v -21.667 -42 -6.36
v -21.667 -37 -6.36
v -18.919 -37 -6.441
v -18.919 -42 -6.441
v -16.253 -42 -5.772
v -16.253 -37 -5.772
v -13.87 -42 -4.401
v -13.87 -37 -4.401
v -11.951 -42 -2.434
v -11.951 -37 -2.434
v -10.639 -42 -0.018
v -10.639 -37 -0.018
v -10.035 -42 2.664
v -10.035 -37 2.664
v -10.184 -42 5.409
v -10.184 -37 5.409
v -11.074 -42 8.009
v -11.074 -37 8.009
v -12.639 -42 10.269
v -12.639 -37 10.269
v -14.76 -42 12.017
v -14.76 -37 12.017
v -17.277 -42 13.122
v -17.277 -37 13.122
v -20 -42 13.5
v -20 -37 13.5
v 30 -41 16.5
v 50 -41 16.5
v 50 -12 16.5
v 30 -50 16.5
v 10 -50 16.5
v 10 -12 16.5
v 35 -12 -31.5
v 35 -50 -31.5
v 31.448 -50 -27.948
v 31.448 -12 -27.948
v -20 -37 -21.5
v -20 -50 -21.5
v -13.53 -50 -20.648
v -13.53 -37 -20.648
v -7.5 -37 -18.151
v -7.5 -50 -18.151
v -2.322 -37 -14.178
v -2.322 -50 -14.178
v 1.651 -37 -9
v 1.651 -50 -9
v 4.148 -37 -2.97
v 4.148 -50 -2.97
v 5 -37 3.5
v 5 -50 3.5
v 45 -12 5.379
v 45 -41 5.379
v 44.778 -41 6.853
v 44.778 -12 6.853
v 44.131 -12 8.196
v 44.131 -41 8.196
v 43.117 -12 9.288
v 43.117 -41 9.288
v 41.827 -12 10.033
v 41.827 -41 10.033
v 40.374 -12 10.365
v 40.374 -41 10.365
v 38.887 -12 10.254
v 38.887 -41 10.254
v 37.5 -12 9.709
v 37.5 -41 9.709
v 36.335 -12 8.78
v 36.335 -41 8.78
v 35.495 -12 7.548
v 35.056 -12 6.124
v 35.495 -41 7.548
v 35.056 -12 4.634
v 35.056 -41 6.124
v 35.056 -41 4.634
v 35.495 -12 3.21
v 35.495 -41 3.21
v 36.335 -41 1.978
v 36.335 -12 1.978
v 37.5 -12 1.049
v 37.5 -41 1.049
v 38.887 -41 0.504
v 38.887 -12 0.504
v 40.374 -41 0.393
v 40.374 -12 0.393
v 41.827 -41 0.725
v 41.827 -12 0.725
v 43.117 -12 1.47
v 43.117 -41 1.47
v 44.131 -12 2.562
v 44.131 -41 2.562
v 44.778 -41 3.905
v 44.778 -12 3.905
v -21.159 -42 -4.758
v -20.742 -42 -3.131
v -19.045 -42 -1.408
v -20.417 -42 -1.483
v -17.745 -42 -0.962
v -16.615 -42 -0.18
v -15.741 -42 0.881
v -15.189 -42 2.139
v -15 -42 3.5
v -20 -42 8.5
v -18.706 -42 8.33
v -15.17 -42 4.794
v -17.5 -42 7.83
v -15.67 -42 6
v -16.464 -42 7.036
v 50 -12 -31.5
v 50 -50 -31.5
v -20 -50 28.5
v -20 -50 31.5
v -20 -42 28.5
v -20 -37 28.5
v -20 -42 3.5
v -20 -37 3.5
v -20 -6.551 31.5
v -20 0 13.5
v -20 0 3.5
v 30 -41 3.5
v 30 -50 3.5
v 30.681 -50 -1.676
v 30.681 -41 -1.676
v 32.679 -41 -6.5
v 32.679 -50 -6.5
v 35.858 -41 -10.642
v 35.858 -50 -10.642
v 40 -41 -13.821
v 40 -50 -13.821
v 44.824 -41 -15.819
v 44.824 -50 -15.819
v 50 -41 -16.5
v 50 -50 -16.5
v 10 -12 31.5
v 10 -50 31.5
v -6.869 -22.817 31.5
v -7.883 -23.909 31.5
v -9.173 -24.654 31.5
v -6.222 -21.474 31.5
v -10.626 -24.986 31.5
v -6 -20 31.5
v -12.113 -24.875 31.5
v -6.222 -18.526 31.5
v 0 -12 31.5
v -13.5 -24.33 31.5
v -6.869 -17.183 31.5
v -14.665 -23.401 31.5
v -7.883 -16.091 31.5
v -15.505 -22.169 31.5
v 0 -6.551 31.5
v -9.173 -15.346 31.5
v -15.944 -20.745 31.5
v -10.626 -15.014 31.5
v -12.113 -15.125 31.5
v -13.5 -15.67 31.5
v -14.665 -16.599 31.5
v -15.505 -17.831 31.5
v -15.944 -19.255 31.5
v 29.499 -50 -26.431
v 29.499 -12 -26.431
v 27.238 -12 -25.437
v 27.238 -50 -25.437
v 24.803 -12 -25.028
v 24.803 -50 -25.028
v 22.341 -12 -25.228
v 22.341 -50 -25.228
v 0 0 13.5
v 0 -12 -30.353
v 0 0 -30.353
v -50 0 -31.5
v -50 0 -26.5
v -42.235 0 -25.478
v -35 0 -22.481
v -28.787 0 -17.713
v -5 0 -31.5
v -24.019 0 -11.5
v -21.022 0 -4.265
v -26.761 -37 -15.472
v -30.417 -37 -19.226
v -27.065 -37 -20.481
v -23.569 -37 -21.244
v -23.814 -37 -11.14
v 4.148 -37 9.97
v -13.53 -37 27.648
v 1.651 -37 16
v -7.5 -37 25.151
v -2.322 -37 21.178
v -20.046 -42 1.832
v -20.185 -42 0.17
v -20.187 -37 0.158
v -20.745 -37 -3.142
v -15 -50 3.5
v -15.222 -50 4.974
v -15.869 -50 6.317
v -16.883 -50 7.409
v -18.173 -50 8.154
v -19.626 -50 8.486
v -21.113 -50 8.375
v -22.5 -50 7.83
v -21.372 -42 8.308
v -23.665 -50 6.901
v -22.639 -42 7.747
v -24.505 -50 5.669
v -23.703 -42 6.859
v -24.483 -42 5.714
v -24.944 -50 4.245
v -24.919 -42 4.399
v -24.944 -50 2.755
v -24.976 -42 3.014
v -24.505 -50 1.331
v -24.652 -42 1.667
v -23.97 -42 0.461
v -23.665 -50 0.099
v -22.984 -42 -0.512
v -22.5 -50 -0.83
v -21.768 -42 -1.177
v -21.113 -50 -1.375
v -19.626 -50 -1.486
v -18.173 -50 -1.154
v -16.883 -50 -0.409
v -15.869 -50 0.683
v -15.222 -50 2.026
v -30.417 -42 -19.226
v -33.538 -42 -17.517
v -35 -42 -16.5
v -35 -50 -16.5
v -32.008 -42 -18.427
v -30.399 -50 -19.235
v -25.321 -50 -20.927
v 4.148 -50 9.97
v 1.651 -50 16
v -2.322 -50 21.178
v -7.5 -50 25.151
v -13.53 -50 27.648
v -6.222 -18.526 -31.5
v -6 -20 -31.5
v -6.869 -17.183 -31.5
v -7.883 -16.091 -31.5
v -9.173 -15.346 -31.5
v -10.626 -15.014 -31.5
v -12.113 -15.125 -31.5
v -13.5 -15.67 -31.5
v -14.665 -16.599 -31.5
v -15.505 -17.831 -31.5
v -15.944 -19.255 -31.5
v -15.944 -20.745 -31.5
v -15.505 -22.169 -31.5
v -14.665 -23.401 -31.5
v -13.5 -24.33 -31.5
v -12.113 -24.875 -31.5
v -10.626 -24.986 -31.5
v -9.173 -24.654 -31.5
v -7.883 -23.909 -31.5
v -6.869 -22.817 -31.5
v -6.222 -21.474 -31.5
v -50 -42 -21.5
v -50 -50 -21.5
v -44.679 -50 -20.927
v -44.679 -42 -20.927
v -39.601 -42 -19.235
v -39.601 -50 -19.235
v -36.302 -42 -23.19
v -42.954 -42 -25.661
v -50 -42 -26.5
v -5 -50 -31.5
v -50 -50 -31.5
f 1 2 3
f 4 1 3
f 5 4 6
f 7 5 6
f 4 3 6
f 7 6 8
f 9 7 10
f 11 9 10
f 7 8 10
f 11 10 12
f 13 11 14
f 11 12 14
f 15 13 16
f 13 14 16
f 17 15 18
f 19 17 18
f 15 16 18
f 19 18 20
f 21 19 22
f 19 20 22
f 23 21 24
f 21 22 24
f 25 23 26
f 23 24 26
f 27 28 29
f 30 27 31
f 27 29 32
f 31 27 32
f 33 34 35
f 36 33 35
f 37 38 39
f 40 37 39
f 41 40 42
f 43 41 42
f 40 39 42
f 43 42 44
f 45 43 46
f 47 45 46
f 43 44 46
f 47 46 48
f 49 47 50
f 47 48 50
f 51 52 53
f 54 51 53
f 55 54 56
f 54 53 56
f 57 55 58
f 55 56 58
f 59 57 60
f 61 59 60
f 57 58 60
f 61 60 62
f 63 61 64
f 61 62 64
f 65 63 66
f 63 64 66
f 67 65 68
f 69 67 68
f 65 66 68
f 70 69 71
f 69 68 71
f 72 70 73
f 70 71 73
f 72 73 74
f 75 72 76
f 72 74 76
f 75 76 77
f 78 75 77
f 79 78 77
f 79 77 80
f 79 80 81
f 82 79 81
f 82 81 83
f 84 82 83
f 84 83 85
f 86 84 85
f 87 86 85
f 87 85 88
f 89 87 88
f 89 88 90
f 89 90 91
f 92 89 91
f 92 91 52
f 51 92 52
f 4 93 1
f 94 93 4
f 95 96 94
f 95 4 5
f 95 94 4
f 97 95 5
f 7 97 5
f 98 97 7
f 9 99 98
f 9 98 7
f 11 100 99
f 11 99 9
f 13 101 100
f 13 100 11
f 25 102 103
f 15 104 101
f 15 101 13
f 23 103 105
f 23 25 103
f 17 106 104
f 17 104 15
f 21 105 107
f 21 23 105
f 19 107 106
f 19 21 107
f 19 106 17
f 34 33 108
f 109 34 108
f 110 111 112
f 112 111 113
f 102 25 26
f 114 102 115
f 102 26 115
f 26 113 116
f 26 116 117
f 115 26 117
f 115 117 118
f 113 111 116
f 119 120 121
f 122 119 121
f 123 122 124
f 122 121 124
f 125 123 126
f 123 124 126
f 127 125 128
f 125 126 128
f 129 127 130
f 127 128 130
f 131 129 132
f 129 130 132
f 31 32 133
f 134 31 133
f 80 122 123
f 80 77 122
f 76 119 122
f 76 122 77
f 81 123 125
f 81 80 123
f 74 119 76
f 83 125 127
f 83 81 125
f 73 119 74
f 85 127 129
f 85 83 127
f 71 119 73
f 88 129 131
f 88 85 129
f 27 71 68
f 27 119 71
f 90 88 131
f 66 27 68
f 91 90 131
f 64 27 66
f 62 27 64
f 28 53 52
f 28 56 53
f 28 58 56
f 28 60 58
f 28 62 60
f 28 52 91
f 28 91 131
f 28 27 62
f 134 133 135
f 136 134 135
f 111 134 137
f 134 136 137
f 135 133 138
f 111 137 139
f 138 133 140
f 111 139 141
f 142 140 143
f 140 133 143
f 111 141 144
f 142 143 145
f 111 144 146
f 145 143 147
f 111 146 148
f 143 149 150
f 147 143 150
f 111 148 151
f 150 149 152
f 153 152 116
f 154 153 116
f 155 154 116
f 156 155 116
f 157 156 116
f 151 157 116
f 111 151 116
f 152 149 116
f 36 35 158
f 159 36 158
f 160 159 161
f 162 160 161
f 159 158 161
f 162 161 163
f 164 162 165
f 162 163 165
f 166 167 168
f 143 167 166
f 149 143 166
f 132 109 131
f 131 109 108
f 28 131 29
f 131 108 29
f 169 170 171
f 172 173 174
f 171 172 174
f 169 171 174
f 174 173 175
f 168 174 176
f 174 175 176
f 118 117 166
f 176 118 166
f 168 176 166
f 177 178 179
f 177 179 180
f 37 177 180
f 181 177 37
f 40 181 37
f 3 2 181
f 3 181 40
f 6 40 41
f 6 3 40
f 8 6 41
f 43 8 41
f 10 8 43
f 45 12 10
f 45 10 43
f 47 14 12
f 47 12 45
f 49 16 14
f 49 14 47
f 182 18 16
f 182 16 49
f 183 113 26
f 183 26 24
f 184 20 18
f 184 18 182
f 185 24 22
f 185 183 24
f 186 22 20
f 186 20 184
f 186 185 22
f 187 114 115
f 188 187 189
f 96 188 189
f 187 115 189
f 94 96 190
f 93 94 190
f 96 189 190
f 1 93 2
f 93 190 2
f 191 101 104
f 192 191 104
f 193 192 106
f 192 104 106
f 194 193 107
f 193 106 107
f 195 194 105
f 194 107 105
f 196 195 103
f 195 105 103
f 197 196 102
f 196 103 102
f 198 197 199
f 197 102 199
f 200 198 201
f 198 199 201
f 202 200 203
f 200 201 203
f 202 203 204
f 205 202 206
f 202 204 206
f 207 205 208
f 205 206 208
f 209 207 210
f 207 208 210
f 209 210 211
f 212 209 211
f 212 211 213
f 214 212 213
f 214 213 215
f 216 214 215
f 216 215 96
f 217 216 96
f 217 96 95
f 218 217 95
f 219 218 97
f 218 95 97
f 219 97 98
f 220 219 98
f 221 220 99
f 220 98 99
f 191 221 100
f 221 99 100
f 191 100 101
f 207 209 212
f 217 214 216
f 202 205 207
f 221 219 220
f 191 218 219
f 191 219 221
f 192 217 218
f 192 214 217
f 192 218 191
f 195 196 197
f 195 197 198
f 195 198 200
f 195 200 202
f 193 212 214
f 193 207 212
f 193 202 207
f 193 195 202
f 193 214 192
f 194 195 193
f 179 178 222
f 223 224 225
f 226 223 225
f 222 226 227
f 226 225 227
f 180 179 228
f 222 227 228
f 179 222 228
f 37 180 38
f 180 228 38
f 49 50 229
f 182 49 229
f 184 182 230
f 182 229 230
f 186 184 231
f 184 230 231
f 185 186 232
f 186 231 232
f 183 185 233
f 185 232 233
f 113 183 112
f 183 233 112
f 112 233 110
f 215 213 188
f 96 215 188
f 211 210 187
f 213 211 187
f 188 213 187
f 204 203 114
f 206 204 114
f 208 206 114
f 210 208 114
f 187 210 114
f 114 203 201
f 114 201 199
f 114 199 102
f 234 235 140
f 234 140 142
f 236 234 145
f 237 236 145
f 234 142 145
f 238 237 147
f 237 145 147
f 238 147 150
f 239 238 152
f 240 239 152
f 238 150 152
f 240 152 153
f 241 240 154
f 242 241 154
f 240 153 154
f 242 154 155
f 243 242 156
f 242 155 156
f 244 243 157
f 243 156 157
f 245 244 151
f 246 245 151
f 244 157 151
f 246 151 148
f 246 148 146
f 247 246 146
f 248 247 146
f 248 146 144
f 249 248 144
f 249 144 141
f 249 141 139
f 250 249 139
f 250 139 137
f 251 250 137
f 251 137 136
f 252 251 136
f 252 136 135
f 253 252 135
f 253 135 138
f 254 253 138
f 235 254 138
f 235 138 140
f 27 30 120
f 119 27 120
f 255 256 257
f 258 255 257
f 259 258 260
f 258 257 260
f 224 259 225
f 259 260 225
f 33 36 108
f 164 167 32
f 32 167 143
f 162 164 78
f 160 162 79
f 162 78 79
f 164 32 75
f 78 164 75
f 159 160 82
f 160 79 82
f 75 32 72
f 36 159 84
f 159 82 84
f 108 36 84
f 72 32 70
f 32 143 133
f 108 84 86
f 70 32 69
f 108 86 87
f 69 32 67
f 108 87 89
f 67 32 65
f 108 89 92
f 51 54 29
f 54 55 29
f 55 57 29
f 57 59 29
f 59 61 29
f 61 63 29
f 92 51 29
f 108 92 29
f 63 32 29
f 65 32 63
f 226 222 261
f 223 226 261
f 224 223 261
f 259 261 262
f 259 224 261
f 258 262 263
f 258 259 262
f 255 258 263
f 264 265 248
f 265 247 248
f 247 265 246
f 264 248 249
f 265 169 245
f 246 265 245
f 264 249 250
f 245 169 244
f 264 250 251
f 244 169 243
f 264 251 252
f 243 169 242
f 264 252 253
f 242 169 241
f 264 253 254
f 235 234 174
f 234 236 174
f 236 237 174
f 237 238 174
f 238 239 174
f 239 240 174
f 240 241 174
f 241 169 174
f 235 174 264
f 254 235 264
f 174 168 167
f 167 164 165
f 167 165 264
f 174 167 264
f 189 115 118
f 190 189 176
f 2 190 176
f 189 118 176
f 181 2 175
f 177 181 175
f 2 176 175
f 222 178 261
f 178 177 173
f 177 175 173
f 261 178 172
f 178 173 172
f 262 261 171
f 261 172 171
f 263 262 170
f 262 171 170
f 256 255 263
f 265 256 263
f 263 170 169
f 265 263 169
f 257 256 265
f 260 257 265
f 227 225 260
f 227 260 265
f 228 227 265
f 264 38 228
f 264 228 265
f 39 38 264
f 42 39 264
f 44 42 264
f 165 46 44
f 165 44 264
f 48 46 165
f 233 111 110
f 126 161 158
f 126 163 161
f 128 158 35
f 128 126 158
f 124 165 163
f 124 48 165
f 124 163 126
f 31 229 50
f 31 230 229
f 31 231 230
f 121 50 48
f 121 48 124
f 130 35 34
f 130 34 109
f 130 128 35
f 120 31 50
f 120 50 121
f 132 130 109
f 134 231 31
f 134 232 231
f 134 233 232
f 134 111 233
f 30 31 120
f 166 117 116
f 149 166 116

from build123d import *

# Parameters (mm, degrees)
F1_DEPTH  = 50
F3_DEPTH  = 9
F4_R      = 5
F5_DEPTH  = 100
F7_DEPTH  = 8
F9_DEPTH  = 42
F11_DEPTH = 13
F12_W     = 5.5079008639
F12_H     = 3.6583239734
F13_DEPTH = 25
F15_DEPTH = 5
F16_R     = 5
F17_DEPTH = 8
F19_DEPTH = 70.001
F20_W     = 50
F20_H     = 12
F21_DEPTH = 63.001
F22_R     = 5
F23_DEPTH = 63.001
F25_DEPTH = 50.001


with BuildPart() as f1:
    # F0 (on Front) → F1 (new body)
    with BuildSketch(Plane.XZ):
        Polygon((-50, 31.5), (-50, -31.5), (50, -31.5), (50, 16.5), (10, 16.5), (10, 31.5), align=None)
    extrude(amount=F1_DEPTH)

    # F2 (on face) → F3 (cut)
    with BuildSketch(Plane.XZ.offset(50)):
        with BuildLine():
            ThreePointArc((50, -16.5), (64.1421356237, -10.6421356237), (70, 3.5))
            ThreePointArc((70, 3.5), (50, 23.5), (30, 3.5))
            ThreePointArc((30, 3.5), (35.8578643763, -10.6421356237), (50, -16.5))
        make_face()
        with BuildLine():
            Line((30, 16.5), (30, 3.5))
            ThreePointArc((30, 3.5), (31.2386876382, 10.4291527956), (34.8013158464, 16.5))
            Line((34.8013158464, 16.5), (30, 16.5))
        make_face()
    extrude(amount=-F3_DEPTH, mode=Mode.SUBTRACT)

    # F4 (on face) → F5 (cut)
    with BuildSketch(Plane.XZ.offset(41)):
        with Locations((40, 5.378967151)):
            Circle(F4_R)
    extrude(amount=-F5_DEPTH, mode=Mode.SUBTRACT)

    # F6 (on face) → F7 (cut)
    with BuildSketch(Plane.XZ.offset(50)):
        with BuildLine():
            ThreePointArc((-50, -21.5), (-32.3223304703, -14.1776695297), (-25, 3.5))
            ThreePointArc((-25, 3.5), (-67.6776695297, 21.1776695297), (-50, -21.5))
        make_face()
        with BuildLine():
            Line((-50, 31.5), (-50, 28.5))
            ThreePointArc((-50, 28.5), (-32.3223304703, 21.1776695297), (-25, 3.5))
            Line((-25, 3.5), (-25, 31.5))
            Line((-25, 31.5), (-50, 31.5))
        make_face()
    extrude(amount=-F7_DEPTH, mode=Mode.SUBTRACT)

    # F8 (on face) → F9 (cut)
    with BuildSketch(Plane(origin=(0, 0, 0), x_dir=(-1, 0, 0), z_dir=(0, 1, 0))):
        with BuildLine():
            ThreePointArc((50, -26.5), (71.2132034356, -17.7132034356), (80, 3.5))
            ThreePointArc((80, 3.5), (50, 33.5), (20, 3.5))
            ThreePointArc((20, 3.5), (28.7867965644, -17.7132034356), (50, -26.5))
        make_face()
        with BuildLine():
            Line((20, 31.5), (20, 3.5))
            ThreePointArc((20, 3.5), (25.2703630392, 20.4836702684), (39.2296703857, 31.5))
            Line((39.2296703857, 31.5), (20, 31.5))
        make_face()
    extrude(amount=-F9_DEPTH, mode=Mode.SUBTRACT)

    # F10 (on face) → F11 (cut)
    with BuildSketch(Plane.XZ.offset(50)):
        with BuildLine():
            ThreePointArc((-20, -21.5), (-2.3223304703, -14.1776695297), (5, 3.5))
            ThreePointArc((5, 3.5), (-37.6776695297, 21.1776695297), (-20, -21.5))
        make_face()
    extrude(amount=-F11_DEPTH, mode=Mode.SUBTRACT)

    # F12 (on face) → F13 (cut)
    with BuildSketch(Plane(origin=(0, -42, 0), x_dir=(-1, 0, 0), z_dir=(0, 1, 0))):
        with Locations((22.7539504319, 29.6708380133)):
            Rectangle(F12_W, F12_H)
    extrude(amount=-F13_DEPTH, mode=Mode.SUBTRACT)

    # F14 (on face) → F15 (join)
    with BuildSketch(Plane.XZ.offset(37)):
        with BuildLine():
            ThreePointArc((-20, 3.5), (-20.4196010845, -1.5), (-21.6666666667, -6.3601329718))
            ThreePointArc((-21.6666666667, -6.3601329718), (-10.0350281055, 2.6637373972), (-20, 13.5))
            Line((-20, 13.5), (-20, 3.5))
        make_face()
    extrude(amount=F15_DEPTH)

    # F16 (on face) → F17 (join)
    with BuildSketch(Plane.XZ.offset(42)):
        with Locations((-20, 3.5)):
            Circle(F16_R)
    extrude(amount=F17_DEPTH)

    # F18 (on face) → F19 (cut, through all)
    with BuildSketch(Plane(origin=(-20, 0, 0), x_dir=(0, -1, 0), z_dir=(-1, 0, 0))):
        Polygon((0, 31.5), (0, 13.5), (6.5514642168, 31.5), align=None)
    extrude(amount=-F19_DEPTH, mode=Mode.SUBTRACT)

    # F20 (on face) → F21 (cut, through all)
    with BuildSketch(Plane.XY.offset(31.5)):
        with Locations((25, -6)):
            Rectangle(F20_W, F20_H)
    extrude(amount=-F21_DEPTH, mode=Mode.SUBTRACT)

    # F22 (on face) → F23 (cut, through all)
    with BuildSketch(Plane.XY.offset(31.5)):
        with Locations((-11, -20)):
            Circle(F22_R)
    extrude(amount=-F23_DEPTH, mode=Mode.SUBTRACT)

    # F24 (on face) → F25 (cut, through all)
    with BuildSketch(Plane.XZ.offset(50)):
        with BuildLine():
            Line((22.3409673765, -25.2284990706), (-5, -31.5))
            Line((-5, -31.5), (35, -31.5))
            Line((35, -31.5), (31.4479835543, -27.9479835543))
            ThreePointArc((31.4479835543, -27.9479835543), (27.2382101912, -25.437141636), (22.3409673765, -25.2284990706))
        make_face()
    extrude(amount=-F25_DEPTH, mode=Mode.SUBTRACT)


solid = f1.part
